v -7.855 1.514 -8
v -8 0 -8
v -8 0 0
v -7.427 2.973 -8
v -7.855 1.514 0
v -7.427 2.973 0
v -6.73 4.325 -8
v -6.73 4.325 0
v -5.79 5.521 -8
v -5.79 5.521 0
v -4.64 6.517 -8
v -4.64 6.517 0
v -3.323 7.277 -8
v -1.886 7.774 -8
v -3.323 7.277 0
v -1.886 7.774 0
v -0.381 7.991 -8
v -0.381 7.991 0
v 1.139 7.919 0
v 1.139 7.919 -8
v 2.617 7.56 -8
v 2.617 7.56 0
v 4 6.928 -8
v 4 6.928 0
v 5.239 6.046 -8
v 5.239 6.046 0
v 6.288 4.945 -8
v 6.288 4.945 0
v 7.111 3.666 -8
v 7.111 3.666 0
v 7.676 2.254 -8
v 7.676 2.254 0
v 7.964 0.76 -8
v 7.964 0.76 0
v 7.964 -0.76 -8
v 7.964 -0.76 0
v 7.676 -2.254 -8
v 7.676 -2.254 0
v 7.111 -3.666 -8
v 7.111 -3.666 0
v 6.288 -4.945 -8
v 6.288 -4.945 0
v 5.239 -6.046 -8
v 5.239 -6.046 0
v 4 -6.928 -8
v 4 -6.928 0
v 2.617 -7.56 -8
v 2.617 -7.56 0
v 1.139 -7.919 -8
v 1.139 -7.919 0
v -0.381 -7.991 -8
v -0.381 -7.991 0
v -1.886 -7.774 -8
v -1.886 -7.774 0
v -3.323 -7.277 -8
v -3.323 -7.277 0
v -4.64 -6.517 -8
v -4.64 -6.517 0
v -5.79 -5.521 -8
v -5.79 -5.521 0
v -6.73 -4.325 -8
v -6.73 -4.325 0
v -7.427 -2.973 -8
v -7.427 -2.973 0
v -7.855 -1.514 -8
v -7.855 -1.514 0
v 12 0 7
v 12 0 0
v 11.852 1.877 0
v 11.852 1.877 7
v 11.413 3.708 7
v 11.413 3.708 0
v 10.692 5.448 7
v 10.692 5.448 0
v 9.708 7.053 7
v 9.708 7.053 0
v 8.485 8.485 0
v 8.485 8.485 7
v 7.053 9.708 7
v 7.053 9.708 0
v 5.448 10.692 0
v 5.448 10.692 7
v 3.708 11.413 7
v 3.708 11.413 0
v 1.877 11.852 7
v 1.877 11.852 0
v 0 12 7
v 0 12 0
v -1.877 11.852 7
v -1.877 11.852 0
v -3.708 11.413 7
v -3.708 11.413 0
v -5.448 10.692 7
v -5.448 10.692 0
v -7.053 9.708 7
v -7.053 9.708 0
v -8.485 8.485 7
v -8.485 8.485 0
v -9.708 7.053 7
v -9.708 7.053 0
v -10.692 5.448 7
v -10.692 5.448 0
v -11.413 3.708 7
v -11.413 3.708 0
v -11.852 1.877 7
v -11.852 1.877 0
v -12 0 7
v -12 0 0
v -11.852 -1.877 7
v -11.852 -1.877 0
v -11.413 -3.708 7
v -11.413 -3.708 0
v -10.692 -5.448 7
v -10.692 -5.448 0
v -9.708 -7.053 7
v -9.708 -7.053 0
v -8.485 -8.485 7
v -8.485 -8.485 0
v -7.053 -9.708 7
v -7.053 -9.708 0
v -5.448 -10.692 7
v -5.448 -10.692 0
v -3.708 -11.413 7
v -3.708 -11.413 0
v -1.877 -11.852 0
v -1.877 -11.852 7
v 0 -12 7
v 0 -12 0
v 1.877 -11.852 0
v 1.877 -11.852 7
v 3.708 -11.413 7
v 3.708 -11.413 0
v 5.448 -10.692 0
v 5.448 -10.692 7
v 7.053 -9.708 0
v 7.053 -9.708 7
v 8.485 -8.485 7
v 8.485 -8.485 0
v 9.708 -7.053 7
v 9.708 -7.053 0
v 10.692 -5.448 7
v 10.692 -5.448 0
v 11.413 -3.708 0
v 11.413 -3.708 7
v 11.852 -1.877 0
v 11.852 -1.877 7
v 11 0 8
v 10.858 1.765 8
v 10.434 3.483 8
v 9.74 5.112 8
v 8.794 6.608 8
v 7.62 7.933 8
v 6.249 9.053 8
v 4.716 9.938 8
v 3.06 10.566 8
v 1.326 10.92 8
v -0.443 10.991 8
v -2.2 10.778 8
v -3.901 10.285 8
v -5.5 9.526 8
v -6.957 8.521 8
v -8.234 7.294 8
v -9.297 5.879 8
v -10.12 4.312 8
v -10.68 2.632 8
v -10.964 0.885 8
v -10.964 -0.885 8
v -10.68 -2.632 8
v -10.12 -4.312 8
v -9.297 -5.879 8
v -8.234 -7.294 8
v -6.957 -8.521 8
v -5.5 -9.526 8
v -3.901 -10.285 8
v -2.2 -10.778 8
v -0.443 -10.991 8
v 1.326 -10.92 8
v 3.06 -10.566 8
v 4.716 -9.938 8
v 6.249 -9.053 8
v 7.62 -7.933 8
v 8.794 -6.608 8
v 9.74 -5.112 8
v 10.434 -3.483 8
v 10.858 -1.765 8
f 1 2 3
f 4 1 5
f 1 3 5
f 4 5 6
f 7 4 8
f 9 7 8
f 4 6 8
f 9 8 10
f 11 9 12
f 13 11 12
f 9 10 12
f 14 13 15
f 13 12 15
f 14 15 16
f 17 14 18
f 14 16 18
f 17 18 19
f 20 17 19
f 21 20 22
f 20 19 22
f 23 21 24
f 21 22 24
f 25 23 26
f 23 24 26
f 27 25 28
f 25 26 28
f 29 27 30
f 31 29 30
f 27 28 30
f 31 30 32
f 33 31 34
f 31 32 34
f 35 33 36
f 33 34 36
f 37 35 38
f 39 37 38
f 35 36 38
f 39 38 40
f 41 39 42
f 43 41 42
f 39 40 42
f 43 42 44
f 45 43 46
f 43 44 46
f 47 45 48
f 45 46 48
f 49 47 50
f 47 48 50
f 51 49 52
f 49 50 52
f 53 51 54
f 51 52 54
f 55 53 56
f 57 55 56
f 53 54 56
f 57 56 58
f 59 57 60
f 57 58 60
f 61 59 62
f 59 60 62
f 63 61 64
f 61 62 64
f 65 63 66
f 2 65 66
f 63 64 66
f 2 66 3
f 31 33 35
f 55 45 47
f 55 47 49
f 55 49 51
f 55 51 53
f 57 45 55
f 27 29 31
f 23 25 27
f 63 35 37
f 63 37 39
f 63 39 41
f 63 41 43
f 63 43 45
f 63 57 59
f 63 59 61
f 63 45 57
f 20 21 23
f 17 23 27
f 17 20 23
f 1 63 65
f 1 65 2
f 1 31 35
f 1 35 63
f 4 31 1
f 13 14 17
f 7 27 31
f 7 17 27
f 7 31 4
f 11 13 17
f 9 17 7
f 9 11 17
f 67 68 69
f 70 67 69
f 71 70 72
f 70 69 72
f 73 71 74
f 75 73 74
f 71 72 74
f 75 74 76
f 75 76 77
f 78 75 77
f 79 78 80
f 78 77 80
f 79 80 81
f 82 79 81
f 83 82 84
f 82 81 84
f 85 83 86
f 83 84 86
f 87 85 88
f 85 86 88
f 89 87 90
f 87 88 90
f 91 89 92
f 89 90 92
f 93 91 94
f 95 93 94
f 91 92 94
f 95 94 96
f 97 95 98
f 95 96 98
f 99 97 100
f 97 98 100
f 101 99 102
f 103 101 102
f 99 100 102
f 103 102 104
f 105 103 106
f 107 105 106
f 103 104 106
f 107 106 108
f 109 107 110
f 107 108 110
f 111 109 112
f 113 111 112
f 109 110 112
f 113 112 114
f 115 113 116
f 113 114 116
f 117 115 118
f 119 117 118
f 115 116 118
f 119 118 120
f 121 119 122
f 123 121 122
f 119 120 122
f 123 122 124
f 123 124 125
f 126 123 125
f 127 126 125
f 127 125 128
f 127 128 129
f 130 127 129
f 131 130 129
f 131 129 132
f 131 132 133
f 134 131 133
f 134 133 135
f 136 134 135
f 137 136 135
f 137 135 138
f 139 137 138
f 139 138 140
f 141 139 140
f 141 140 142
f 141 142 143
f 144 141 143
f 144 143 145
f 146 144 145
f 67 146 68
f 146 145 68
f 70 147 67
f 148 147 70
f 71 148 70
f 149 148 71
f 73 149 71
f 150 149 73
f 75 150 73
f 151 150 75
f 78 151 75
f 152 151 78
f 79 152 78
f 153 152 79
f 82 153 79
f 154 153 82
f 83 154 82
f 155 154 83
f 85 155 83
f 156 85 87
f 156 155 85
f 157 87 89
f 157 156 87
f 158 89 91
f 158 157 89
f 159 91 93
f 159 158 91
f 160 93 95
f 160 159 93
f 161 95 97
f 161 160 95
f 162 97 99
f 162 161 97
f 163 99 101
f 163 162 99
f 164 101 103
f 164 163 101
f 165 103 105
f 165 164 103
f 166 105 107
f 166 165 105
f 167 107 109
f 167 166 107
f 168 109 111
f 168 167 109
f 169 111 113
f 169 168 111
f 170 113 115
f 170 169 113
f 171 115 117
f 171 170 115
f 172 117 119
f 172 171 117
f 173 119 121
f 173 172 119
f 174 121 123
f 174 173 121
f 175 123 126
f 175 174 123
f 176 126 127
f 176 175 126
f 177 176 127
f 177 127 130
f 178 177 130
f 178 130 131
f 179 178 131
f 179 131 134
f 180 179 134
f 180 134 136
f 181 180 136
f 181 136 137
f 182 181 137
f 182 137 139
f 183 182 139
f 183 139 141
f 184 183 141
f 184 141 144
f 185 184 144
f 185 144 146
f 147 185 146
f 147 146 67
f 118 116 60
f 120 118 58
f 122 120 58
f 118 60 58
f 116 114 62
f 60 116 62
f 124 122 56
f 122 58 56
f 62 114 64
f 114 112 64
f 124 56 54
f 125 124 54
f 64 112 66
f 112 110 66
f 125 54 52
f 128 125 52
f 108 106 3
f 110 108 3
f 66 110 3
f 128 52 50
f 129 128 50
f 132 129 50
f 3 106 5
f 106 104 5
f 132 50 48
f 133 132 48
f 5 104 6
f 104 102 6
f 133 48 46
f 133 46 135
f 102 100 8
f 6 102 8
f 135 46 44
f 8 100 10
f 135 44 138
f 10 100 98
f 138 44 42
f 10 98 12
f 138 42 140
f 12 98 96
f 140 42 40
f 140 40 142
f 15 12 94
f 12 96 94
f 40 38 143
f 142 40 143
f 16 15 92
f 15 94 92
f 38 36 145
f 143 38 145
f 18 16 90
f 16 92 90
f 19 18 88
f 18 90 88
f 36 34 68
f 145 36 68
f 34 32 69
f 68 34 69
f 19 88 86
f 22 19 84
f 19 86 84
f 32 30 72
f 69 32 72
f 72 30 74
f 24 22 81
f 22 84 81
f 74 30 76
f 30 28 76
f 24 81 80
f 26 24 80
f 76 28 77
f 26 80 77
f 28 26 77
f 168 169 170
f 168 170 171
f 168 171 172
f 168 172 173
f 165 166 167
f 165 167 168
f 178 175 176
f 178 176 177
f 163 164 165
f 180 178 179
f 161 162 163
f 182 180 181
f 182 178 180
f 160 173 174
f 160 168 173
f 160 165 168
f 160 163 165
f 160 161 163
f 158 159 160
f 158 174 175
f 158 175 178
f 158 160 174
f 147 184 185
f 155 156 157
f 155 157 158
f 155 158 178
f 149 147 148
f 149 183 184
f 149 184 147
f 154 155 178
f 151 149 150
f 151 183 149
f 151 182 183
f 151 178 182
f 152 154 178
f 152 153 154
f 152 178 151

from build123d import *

# Parameters (mm, degrees)
SKETCH1_R           = 12
BOSS_EXTRUDE1_DEPTH = 8
CHAMFER1_SIZE       = 1
SKETCH2_R           = 8
BOSS_EXTRUDE2_DEPTH = 8


with BuildPart() as part:
    # Sketch1 → Boss-Extrude1 (new body)
    with BuildSketch(Plane.XY):
        Circle(SKETCH1_R)
    extrude(amount=BOSS_EXTRUDE1_DEPTH)

    # Chamfer1
    chamfer1_edges = [part.edges().sort_by_distance(p)[0] for p in [
        (-12, 0, 8),
    ]]
    chamfer(chamfer1_edges, length=CHAMFER1_SIZE)

    # Sketch2 → Boss-Extrude2 (add)
    with BuildSketch(Plane(origin=(0, 0, 0), x_dir=(-1, 0, 0), z_dir=(0, 0, -1))):
        Circle(SKETCH2_R)
    extrude(amount=BOSS_EXTRUDE2_DEPTH)


solid = part.part
